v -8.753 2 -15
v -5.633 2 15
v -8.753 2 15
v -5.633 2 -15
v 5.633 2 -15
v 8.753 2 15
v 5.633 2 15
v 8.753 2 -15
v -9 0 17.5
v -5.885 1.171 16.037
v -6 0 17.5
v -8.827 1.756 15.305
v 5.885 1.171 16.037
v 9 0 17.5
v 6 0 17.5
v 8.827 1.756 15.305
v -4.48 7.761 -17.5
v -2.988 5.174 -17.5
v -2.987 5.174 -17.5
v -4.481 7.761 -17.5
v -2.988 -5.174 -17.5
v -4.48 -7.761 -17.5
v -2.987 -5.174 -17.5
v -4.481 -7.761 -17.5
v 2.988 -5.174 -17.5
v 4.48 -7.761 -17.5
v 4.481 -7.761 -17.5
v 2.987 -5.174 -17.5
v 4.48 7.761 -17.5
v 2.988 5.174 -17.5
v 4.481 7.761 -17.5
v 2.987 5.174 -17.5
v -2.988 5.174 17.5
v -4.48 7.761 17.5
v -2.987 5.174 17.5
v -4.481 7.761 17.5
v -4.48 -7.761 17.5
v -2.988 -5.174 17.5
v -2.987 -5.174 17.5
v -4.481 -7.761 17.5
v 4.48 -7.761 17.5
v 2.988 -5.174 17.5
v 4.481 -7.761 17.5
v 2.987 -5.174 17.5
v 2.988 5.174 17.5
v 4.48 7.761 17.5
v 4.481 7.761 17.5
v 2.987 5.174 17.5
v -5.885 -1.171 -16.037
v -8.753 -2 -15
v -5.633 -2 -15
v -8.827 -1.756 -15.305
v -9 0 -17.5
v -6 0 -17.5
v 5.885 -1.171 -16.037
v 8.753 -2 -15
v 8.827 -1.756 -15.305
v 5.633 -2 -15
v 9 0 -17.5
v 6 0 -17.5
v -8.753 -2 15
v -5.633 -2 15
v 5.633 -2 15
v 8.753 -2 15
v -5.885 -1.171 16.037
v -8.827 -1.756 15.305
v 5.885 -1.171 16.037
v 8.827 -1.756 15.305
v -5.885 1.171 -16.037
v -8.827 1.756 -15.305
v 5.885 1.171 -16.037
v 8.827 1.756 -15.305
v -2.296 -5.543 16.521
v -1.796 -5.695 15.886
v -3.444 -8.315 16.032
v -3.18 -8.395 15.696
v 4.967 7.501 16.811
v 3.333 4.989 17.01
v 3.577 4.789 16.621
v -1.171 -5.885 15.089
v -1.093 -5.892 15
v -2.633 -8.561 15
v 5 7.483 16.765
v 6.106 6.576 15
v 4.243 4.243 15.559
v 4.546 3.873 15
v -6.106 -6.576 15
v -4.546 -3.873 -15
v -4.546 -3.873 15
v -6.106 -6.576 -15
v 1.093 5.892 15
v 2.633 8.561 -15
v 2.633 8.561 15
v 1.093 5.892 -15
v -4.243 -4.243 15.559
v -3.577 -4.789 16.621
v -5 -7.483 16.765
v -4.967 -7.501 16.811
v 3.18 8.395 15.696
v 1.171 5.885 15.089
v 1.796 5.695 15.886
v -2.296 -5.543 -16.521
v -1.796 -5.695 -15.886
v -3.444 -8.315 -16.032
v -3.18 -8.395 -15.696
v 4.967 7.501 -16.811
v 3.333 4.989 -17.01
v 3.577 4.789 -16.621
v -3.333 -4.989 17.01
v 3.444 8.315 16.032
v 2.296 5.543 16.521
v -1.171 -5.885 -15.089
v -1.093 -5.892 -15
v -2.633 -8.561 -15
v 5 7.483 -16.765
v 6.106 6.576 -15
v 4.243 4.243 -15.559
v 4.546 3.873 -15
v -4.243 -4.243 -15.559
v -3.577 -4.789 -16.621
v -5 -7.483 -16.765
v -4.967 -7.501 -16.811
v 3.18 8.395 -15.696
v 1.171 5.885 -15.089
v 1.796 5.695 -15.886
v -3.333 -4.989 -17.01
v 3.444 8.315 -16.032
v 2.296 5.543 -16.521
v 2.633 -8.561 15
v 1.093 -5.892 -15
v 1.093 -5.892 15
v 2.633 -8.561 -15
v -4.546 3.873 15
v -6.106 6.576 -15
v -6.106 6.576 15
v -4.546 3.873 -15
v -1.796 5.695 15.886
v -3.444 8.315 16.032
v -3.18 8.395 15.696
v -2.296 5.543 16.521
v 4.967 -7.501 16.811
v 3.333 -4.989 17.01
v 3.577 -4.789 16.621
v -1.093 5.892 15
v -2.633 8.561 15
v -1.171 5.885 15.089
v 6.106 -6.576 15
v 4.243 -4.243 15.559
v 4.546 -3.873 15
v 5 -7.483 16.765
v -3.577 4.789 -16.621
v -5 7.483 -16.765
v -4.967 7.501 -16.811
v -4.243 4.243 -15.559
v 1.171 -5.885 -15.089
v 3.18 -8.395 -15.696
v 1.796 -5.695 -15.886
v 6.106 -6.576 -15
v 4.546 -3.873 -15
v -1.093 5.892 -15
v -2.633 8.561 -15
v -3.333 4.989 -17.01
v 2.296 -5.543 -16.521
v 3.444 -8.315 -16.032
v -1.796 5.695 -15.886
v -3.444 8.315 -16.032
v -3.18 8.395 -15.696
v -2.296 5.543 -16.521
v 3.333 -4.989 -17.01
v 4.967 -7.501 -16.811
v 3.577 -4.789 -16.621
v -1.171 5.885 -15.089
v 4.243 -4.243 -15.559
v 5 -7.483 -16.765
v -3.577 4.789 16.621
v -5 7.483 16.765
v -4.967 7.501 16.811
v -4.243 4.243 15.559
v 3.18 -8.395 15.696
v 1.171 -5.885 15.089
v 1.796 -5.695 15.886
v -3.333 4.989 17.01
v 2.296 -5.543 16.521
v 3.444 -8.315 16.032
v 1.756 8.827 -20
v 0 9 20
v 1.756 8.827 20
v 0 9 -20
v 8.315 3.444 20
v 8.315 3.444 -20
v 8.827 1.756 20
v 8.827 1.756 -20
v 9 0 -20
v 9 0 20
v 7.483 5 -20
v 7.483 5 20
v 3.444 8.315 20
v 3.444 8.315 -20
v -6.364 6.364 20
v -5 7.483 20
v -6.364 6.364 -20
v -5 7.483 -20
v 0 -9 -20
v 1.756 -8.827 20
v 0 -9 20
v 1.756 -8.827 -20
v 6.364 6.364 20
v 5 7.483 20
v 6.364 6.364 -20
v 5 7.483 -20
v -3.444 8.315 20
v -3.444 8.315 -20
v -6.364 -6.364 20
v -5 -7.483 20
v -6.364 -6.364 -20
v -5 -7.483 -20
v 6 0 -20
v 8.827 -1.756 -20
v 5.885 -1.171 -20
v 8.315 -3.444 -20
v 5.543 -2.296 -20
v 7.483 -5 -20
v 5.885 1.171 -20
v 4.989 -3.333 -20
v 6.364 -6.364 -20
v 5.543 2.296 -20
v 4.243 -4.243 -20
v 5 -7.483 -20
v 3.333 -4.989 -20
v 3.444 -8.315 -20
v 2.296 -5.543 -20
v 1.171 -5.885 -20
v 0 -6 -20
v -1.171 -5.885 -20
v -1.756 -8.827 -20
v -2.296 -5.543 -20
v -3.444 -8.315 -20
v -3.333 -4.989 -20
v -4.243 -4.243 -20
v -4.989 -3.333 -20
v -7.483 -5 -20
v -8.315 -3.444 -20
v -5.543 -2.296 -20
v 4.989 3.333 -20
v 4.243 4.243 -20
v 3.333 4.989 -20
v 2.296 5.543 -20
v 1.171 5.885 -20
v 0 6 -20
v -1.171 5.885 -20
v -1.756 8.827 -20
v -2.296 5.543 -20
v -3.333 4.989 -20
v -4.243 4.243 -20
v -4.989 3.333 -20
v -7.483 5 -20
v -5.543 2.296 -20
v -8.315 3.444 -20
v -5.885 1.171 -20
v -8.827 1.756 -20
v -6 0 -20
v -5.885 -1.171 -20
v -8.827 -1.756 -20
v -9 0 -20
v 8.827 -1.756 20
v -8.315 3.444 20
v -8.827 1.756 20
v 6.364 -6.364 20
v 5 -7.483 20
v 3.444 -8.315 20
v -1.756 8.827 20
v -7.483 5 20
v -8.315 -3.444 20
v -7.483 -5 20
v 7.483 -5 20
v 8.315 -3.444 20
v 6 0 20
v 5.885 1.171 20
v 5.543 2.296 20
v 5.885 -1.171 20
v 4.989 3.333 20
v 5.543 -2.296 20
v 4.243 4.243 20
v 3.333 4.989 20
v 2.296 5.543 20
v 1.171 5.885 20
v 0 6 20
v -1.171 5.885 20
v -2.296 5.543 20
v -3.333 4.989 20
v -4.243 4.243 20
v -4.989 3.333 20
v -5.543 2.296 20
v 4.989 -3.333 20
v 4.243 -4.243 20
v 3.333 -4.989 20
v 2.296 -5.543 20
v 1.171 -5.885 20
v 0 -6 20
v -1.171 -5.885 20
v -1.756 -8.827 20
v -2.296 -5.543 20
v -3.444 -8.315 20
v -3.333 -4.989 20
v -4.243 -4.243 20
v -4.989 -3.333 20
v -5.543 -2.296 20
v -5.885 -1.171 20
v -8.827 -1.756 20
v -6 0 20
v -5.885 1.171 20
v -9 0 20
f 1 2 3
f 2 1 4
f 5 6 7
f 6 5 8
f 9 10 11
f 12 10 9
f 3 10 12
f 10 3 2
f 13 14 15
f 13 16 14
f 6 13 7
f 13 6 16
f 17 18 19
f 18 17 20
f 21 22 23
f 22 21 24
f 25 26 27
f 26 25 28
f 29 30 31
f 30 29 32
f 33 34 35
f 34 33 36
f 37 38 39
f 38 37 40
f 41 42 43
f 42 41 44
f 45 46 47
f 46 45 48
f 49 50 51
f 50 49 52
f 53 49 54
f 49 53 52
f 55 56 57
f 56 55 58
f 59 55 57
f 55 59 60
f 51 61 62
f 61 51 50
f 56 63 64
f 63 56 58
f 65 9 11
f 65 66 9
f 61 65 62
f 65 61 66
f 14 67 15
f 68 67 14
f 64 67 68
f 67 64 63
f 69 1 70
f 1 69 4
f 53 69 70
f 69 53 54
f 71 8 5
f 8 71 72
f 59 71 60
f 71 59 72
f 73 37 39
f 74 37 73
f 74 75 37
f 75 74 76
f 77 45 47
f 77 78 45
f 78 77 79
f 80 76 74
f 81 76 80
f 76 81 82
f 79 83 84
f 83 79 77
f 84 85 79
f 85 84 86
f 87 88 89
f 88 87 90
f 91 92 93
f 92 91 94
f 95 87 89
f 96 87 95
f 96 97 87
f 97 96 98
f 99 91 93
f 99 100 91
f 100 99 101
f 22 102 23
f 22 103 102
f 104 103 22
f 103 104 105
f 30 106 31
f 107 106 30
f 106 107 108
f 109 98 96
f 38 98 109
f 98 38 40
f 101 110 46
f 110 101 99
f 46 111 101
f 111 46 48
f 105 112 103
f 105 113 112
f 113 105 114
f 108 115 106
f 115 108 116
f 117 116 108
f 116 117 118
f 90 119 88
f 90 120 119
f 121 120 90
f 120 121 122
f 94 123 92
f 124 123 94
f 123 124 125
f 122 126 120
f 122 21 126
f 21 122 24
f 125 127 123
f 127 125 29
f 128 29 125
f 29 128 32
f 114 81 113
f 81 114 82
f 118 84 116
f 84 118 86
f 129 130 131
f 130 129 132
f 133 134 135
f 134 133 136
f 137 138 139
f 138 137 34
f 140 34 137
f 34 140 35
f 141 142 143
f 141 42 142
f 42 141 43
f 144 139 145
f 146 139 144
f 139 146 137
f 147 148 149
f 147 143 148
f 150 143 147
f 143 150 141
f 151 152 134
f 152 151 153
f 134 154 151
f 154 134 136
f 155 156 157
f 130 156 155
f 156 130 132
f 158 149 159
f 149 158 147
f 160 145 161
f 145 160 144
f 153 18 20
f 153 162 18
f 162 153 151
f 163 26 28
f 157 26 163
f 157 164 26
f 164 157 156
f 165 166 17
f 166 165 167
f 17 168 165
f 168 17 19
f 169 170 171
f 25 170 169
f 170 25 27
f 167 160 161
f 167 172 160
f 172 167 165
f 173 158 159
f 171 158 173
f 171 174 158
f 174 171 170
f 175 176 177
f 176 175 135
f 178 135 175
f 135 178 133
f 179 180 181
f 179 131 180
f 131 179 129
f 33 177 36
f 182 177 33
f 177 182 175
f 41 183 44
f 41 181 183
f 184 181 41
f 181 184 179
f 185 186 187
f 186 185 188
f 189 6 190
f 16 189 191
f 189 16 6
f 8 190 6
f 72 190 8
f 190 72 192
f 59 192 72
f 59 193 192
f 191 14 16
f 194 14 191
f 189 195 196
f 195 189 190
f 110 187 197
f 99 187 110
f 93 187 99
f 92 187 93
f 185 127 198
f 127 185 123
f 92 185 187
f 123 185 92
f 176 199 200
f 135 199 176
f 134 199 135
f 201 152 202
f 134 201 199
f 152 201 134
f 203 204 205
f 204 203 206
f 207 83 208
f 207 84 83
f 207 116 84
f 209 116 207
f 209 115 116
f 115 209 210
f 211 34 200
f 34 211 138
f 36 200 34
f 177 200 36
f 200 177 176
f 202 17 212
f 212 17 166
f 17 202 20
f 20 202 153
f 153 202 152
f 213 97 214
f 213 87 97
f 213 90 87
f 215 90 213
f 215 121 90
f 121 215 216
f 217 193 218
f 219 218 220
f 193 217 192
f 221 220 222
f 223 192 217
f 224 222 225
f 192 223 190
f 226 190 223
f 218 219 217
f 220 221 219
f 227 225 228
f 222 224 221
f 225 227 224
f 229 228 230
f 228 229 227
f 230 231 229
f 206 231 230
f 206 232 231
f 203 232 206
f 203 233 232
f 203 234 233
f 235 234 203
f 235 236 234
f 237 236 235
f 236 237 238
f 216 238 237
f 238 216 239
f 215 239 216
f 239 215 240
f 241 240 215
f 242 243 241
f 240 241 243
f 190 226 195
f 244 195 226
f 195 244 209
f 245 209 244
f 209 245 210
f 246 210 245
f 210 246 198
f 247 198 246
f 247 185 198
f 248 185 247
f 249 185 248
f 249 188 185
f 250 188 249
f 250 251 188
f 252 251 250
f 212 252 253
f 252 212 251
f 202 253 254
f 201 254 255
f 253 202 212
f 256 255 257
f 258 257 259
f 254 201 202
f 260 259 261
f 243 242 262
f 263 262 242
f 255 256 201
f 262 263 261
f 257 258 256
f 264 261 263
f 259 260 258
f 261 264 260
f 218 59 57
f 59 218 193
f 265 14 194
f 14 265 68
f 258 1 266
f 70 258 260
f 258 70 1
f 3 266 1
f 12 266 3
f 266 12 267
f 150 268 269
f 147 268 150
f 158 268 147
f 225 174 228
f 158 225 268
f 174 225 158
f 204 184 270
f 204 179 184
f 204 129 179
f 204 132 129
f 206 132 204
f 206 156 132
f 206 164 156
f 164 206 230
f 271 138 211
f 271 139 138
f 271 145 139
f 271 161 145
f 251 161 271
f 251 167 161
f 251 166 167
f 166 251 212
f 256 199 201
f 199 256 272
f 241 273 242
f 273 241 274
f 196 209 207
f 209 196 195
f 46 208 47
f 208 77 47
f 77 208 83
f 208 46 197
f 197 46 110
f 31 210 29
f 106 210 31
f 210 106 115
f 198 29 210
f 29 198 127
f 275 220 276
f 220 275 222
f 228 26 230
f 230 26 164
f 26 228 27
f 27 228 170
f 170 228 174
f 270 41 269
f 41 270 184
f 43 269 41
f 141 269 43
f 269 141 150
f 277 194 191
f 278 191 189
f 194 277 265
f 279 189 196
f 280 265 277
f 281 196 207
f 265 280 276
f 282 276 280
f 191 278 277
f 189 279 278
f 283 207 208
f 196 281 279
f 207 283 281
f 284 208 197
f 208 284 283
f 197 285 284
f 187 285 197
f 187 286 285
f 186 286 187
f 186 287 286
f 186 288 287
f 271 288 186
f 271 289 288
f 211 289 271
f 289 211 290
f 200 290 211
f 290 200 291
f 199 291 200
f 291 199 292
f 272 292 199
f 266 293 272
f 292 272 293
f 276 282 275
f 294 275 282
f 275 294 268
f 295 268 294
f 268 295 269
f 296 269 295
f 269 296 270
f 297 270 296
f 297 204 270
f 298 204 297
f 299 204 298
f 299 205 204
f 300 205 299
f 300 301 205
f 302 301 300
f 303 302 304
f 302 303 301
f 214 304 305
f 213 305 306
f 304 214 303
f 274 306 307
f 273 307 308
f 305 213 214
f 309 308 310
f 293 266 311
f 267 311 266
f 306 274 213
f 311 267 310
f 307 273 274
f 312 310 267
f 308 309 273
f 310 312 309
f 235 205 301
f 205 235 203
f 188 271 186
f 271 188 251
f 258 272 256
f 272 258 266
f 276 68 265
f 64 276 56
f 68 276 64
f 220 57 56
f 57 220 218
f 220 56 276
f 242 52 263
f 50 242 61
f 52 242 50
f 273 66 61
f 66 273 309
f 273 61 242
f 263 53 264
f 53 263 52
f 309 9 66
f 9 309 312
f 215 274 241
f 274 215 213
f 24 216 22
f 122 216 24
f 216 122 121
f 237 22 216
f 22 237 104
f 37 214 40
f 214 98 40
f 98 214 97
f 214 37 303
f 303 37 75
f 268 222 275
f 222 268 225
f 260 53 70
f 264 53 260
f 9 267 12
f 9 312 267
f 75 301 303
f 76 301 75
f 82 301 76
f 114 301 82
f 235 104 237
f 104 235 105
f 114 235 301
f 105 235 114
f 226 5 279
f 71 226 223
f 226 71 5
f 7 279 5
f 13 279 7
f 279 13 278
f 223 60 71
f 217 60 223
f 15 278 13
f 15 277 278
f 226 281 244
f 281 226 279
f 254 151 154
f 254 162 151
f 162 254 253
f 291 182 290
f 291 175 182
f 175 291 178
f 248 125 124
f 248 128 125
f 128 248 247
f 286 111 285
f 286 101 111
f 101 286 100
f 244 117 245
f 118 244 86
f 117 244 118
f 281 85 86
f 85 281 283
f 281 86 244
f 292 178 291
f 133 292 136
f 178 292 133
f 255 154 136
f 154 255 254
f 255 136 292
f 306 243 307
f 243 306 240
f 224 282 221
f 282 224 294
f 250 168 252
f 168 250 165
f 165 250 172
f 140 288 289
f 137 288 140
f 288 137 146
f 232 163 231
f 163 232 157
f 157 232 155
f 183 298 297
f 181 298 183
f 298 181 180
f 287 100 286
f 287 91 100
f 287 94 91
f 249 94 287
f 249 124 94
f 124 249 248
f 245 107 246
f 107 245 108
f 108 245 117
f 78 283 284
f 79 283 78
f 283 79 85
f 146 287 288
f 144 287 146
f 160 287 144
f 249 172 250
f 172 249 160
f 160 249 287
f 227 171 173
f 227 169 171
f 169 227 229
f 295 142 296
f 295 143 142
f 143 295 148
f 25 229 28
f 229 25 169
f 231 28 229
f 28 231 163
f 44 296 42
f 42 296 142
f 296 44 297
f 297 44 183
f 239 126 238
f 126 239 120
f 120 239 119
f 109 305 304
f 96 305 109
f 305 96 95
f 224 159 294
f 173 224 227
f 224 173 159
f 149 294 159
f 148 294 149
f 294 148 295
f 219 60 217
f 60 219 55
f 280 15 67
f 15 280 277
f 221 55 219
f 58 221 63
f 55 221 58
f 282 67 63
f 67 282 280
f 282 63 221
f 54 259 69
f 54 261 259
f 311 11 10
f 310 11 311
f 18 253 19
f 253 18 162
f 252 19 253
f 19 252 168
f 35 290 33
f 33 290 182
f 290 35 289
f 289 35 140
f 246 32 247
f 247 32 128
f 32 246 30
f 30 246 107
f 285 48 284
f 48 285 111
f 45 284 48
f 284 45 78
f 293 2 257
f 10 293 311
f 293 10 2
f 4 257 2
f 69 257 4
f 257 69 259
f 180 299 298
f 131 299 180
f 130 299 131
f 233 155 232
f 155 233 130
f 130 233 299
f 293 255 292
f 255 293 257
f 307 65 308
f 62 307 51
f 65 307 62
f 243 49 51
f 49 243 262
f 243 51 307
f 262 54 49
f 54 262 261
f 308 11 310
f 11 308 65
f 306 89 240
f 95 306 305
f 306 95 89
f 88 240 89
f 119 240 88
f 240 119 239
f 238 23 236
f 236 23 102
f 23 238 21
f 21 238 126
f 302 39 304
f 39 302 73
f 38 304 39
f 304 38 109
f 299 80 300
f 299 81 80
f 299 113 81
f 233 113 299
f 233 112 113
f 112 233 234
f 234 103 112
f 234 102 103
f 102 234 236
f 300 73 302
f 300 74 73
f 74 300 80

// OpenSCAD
$fn=32;

H=40;
difference() {
    cylinder(d=18,h=H,center=true);
    cylinder(d=12,h=H+1,center=true);
    for(i=[0:60:180-1]){
        rotate(i)
        hull() {
            cube([H,4,H-10],center=true);
            cube([H,.001,H-5],center=true);
        }
    }
}
